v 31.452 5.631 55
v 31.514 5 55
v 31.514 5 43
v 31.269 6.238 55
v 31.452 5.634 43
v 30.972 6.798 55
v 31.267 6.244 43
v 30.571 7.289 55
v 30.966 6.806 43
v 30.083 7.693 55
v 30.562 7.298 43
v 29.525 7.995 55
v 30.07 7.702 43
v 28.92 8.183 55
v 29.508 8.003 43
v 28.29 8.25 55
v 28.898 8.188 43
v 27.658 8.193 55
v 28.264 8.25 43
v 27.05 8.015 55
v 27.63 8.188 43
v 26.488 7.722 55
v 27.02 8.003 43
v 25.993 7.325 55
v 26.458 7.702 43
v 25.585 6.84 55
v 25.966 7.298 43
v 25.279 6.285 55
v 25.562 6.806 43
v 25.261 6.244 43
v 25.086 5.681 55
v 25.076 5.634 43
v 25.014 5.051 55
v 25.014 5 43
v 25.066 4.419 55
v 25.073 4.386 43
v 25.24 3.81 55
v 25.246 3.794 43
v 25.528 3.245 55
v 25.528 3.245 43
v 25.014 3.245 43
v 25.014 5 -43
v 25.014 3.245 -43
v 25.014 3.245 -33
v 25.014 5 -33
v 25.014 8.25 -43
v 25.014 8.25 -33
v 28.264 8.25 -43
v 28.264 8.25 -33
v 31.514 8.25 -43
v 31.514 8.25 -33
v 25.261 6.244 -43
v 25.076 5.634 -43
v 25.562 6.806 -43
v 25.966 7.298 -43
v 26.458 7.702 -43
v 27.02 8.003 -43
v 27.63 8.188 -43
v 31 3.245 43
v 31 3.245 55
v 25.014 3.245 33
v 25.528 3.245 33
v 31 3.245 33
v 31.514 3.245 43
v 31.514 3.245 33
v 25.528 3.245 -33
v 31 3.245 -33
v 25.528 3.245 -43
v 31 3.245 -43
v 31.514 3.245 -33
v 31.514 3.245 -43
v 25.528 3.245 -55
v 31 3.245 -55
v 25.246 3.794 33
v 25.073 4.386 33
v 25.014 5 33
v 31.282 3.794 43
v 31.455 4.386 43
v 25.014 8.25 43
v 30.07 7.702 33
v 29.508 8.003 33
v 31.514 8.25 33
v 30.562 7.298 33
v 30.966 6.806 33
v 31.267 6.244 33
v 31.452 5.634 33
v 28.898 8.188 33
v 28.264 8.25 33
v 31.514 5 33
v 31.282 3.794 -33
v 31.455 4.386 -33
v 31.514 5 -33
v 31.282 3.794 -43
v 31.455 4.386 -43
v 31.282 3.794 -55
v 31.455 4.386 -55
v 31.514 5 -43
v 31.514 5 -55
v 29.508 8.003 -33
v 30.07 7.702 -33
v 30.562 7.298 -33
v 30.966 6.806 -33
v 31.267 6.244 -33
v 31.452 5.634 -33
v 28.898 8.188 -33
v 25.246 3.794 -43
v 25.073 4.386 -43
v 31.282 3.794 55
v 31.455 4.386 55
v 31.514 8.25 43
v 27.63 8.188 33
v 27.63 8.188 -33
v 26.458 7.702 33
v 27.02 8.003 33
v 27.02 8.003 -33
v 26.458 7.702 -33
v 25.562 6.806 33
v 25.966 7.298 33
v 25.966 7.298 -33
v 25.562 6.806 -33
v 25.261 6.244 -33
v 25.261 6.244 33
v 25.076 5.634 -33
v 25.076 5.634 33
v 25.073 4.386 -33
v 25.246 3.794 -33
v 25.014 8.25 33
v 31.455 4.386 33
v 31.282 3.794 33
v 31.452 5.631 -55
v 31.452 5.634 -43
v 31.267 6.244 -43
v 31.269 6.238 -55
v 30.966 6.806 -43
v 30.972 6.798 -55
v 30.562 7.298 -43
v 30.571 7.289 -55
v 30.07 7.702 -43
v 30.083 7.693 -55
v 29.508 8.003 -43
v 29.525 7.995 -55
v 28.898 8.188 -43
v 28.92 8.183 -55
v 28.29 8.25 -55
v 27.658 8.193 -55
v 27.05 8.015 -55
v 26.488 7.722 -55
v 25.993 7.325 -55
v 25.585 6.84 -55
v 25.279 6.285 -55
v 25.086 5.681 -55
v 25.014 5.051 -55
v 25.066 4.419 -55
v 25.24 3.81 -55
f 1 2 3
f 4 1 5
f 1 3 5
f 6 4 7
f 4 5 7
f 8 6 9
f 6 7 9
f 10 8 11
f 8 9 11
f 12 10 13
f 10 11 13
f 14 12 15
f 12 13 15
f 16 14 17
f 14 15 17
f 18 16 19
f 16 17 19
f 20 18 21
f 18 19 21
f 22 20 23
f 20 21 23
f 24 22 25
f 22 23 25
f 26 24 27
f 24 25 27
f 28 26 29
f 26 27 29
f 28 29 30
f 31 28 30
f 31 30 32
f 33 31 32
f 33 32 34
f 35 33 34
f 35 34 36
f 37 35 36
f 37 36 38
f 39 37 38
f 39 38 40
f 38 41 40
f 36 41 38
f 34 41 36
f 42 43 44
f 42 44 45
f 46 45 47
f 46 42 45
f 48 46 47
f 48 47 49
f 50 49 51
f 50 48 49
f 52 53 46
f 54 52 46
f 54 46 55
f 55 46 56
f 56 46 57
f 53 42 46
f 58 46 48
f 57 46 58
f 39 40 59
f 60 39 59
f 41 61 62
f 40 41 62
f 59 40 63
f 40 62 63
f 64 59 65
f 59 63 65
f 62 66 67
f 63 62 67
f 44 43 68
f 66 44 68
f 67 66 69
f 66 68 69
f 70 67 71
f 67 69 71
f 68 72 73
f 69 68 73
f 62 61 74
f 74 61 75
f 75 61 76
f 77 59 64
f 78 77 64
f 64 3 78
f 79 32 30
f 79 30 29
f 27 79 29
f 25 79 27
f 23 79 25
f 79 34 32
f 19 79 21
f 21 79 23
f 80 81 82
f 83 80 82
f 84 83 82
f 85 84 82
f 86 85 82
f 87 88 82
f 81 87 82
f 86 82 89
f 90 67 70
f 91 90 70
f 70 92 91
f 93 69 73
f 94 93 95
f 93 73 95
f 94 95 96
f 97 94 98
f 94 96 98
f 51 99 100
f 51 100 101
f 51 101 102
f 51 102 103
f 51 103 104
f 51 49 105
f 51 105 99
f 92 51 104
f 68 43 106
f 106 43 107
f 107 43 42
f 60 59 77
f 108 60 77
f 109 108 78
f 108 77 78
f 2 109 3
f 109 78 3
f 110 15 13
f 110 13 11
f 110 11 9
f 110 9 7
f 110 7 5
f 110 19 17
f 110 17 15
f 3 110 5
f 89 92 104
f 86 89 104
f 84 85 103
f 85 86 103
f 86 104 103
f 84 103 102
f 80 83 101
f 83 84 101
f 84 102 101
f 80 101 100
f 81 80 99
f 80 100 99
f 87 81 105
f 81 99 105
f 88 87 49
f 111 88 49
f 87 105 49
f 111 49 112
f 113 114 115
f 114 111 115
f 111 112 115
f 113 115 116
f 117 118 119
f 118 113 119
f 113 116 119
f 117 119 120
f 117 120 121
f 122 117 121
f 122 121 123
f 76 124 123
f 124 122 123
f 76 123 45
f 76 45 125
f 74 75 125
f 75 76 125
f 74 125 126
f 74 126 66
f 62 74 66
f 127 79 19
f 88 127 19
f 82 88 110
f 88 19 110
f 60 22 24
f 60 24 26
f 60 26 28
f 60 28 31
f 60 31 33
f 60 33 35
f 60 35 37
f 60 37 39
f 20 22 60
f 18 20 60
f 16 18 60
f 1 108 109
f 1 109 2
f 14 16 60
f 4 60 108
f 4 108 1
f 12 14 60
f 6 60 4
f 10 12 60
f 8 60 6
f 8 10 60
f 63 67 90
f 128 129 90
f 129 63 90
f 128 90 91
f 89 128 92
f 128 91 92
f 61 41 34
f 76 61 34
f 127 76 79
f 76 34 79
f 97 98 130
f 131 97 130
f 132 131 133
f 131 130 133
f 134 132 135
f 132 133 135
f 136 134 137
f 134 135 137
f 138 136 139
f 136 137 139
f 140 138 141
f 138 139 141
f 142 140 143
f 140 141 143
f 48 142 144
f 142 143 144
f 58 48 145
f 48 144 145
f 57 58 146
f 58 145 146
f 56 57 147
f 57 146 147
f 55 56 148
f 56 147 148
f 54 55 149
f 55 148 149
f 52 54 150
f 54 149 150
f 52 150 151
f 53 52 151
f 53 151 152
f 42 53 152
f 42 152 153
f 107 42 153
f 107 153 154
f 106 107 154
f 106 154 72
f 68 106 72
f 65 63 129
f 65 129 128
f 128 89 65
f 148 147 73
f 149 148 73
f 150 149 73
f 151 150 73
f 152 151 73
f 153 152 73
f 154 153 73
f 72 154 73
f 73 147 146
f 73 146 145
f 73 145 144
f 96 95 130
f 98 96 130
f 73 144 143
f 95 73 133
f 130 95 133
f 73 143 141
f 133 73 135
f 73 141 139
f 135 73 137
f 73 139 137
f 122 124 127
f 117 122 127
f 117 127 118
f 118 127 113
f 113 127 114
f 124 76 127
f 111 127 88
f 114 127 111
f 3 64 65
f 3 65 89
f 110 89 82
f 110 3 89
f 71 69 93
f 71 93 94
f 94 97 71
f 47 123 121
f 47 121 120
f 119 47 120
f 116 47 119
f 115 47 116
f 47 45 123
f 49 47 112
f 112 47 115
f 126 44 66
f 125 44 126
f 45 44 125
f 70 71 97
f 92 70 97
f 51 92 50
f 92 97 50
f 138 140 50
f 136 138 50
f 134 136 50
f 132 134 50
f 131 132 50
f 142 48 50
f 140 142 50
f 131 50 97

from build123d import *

# Parameters (mm, degrees)
BOSS_EXTRUDE1_DEPTH      = 55
BOSS_EXTRUDE1_DEPTH_BACK = 55
SKETCH4_W                = 6.5
SKETCH4_H                = 5.004744749
BOSS_EXTRUDE3_DEPTH      = 10


with BuildPart() as part:
    # Sketch2 → Boss-Extrude1 (new, two sides: drawn at the far end of the back side and taken through both)
    with BuildSketch(Plane.XY.offset(-BOSS_EXTRUDE1_DEPTH_BACK)):
        with BuildLine():
            Line((25.528440089, 3.245255251), (30.999590193, 3.245255251))
            ThreePointArc((30.999590193, 3.245255251), (31.382758391, 4.08570216), (31.514015141, 5))
            ThreePointArc((31.514015141, 5), (27.349717301, 8.11874325), (25.528440089, 3.245255251))
        make_face()
    extrude(amount=BOSS_EXTRUDE1_DEPTH + BOSS_EXTRUDE1_DEPTH_BACK)

    # Sketch4 → Boss-Extrude3 (add)
    with BuildSketch(Plane.XY.offset(43)):
        with Locations((28.264015141, 5.747627625)):
            Rectangle(SKETCH4_W, SKETCH4_H)
    boss_extrude3 = extrude(amount=-BOSS_EXTRUDE3_DEPTH)

    # Mirror1: Boss-Extrude3 across plane
    add(boss_extrude3.mirror(Plane.XY))


solid = part.part
